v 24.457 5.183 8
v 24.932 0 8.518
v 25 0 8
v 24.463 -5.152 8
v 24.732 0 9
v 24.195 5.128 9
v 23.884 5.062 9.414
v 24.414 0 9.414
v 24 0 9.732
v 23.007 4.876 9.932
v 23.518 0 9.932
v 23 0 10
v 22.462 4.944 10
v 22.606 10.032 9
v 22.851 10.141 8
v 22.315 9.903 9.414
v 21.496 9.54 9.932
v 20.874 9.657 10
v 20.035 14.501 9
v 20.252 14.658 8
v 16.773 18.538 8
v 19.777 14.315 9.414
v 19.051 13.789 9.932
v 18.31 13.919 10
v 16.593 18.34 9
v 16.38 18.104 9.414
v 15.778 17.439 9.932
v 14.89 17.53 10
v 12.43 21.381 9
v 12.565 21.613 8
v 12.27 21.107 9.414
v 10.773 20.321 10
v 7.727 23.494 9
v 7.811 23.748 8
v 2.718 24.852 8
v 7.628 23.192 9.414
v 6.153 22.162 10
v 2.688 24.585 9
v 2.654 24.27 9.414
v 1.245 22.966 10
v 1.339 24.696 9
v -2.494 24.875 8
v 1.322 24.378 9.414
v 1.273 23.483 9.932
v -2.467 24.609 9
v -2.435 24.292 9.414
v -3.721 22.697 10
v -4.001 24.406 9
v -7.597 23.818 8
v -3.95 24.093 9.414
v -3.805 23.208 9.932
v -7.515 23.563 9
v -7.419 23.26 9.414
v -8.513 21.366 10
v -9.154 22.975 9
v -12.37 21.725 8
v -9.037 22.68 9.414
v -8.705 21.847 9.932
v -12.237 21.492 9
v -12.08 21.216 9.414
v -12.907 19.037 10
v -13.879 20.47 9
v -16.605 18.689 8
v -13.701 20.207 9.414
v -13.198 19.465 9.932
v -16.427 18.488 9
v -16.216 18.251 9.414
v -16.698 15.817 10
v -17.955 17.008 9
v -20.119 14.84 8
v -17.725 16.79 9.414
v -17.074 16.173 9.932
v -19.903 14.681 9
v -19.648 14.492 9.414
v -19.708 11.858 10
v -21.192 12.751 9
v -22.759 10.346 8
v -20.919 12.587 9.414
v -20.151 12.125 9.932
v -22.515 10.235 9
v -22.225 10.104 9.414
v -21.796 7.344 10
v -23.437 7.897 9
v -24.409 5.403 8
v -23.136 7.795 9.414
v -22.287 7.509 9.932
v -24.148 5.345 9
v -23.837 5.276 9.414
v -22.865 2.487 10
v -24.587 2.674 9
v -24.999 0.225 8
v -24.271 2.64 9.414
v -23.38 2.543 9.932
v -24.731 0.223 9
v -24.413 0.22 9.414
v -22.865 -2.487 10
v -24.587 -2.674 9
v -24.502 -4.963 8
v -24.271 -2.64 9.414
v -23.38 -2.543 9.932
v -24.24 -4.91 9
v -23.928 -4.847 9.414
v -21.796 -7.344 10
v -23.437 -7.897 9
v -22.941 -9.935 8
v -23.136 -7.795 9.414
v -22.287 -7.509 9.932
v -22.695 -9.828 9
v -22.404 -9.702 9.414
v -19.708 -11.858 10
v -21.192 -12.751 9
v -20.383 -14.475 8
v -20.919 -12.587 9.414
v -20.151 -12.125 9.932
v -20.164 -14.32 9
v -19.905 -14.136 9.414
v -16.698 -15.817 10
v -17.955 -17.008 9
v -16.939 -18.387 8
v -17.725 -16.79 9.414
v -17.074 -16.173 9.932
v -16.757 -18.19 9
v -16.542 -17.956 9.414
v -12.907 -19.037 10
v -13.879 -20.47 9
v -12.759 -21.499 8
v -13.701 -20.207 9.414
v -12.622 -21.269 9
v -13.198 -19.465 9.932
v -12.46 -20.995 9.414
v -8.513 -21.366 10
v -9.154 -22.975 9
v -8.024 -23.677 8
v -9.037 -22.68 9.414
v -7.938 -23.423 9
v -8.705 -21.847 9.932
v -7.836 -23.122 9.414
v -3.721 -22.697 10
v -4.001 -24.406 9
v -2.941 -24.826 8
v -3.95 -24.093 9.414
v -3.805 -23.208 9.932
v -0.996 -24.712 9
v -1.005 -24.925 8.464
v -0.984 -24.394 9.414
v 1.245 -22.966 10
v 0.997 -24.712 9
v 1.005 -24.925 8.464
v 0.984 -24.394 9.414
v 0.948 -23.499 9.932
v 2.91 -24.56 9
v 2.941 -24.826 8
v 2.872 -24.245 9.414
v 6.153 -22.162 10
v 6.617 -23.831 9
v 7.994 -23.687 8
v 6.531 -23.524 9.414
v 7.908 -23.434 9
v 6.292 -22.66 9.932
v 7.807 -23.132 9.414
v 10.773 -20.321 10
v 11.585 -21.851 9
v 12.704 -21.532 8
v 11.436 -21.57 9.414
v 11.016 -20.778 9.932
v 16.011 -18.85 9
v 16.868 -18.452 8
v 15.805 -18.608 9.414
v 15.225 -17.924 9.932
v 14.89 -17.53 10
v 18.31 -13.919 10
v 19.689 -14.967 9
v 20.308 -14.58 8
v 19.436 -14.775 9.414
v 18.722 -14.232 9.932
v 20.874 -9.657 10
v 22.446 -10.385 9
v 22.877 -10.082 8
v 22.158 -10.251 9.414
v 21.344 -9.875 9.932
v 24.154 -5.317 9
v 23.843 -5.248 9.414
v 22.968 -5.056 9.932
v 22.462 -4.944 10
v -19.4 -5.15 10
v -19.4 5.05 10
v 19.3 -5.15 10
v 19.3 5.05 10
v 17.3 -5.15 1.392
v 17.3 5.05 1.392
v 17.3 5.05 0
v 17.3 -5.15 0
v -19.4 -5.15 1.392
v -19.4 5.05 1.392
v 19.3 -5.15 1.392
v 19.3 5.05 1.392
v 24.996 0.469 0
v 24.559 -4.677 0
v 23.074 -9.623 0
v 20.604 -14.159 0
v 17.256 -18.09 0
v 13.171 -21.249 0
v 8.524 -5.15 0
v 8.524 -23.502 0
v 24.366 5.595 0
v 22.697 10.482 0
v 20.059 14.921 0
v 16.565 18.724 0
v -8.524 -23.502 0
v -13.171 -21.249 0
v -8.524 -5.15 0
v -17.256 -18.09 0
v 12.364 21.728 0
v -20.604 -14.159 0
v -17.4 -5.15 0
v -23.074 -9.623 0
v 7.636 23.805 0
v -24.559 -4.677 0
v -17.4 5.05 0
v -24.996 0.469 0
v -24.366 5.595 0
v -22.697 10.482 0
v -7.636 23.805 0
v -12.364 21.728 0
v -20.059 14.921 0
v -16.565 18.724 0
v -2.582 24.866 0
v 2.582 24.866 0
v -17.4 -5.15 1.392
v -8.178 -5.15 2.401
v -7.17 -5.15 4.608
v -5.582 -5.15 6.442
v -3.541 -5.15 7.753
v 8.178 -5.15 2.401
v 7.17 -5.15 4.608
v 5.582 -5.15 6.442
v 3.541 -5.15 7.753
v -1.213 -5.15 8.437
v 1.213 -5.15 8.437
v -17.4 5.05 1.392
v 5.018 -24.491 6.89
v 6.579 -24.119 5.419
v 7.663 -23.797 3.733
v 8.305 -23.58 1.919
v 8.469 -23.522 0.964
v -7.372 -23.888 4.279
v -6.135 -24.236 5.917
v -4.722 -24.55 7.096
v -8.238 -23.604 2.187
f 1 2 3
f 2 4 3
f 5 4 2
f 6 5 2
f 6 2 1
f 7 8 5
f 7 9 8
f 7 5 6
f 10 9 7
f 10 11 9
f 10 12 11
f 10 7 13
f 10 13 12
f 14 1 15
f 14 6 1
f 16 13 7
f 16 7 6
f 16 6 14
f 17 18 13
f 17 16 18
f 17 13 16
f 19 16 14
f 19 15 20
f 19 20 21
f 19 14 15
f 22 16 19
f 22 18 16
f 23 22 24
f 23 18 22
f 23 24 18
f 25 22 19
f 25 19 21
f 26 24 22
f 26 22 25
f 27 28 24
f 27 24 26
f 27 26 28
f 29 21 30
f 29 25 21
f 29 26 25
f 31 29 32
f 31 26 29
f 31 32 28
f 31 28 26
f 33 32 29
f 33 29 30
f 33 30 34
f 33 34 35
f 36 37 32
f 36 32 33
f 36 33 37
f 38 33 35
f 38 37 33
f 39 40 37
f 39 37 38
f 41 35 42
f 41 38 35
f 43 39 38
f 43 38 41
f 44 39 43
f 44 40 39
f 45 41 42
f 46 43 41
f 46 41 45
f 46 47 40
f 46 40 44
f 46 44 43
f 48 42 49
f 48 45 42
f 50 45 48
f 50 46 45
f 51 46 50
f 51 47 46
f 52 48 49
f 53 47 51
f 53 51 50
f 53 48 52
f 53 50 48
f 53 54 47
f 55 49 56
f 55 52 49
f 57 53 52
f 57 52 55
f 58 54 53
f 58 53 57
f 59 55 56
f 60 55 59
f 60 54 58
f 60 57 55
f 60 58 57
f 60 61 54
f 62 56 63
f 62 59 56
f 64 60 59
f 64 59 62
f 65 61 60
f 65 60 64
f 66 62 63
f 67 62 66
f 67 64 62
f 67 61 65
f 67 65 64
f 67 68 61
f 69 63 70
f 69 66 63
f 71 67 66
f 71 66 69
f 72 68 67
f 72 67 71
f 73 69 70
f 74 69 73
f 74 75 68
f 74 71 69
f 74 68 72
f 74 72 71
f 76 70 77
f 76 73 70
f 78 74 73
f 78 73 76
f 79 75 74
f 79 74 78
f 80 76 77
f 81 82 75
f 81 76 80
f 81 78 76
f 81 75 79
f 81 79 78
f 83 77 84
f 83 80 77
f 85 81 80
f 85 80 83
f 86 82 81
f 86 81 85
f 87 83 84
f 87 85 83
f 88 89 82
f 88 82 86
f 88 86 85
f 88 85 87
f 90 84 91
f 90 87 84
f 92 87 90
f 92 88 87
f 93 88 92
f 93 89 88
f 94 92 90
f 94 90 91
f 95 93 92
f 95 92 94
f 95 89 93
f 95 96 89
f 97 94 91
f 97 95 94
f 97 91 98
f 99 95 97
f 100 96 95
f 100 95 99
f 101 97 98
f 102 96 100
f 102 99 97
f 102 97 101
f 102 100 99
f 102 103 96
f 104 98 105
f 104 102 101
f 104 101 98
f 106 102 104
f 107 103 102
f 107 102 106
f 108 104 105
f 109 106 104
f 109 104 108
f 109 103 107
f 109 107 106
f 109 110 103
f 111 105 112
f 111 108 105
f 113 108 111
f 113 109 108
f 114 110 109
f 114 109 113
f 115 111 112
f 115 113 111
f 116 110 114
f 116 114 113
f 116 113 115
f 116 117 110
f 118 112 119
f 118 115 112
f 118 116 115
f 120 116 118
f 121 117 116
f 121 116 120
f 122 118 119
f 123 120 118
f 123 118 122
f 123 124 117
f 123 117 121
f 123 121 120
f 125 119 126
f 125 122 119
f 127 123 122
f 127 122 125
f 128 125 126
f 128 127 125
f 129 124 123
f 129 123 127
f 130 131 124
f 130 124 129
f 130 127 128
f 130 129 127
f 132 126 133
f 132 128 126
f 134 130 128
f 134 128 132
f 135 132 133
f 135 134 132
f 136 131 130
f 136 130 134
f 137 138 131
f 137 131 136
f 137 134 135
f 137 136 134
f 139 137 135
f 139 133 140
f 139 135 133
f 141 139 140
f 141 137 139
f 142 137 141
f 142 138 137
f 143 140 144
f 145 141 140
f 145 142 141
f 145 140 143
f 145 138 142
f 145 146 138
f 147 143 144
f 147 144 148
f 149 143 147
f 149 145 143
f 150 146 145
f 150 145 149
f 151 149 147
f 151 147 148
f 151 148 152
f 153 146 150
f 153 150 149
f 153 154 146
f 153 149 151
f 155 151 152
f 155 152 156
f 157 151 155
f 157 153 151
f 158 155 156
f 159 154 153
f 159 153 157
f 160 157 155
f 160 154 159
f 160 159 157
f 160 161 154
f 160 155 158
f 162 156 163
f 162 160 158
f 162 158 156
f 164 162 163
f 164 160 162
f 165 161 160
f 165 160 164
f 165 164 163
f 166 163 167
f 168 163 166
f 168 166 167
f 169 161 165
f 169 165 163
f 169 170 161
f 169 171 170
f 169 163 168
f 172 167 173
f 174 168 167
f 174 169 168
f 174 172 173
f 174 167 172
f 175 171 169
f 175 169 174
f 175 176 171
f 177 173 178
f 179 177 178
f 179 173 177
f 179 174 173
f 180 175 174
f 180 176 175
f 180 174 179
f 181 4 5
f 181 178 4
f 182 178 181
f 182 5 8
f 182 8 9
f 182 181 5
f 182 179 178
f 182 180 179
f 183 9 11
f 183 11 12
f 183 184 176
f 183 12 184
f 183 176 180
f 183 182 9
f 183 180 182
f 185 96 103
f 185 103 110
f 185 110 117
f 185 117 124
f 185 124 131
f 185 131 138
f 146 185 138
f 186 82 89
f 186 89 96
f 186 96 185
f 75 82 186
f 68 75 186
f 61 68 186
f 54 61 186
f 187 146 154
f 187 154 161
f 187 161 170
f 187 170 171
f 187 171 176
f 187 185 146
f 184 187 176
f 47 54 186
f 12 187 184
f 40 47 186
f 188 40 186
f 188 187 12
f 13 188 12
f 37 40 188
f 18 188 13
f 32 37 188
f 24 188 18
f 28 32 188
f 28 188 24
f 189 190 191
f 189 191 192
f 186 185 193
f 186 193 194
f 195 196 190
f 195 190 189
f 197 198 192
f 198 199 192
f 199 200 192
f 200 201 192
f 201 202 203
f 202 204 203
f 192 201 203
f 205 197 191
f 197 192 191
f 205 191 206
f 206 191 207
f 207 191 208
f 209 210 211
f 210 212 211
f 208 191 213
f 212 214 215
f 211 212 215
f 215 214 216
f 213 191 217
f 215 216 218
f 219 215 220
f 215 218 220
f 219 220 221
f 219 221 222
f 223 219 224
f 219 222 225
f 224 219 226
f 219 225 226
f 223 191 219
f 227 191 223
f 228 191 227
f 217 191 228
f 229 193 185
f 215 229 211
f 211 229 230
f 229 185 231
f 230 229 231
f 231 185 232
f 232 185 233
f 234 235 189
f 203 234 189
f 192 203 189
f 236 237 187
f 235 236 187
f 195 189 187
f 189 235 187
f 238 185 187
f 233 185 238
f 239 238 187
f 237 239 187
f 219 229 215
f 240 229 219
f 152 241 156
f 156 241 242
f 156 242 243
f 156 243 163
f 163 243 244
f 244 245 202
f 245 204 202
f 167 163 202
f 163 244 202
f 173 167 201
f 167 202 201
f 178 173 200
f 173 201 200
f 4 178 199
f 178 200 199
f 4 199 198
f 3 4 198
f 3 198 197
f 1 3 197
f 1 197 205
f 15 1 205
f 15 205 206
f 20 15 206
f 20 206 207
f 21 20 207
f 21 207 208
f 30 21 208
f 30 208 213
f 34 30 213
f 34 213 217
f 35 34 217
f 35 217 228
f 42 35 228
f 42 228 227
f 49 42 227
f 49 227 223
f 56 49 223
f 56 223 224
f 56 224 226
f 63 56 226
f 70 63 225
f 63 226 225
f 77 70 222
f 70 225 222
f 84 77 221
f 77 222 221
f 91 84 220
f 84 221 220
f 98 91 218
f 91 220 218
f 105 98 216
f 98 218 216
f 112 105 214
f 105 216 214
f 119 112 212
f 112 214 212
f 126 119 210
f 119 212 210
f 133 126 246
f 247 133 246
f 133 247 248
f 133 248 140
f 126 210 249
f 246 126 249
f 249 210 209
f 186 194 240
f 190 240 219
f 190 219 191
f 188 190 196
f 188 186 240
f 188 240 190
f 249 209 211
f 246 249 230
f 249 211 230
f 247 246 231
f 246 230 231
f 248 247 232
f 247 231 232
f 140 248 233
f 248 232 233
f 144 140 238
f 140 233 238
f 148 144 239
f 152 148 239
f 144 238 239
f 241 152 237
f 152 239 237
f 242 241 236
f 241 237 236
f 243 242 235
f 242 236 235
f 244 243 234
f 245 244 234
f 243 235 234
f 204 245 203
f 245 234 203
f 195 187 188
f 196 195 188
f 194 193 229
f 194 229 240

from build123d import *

# Parameters (mm, degrees)
F0_R     = 25
F1_DEPTH = 10
F2_W     = 38.7
F2_H     = 10.2
F3_DEPTH = 11
F4_W     = 10.2
F4_H     = 1.3916883618
F5_DEPTH = 2
F6_W     = 10.2
F6_H     = 1.392
F7_DEPTH = 2
F9_DEPTH = 25


# Not quite as in the source:
# - a fillet or chamfer that OpenCascade refuses, or shapes differently, is made with other operations: its cross-section is extruded or revolved along the edge and cut away or added


with BuildPart() as f1:
    # F0 (on Top) → F1 (new body)
    with BuildSketch(Plane.XY):
        Circle(F0_R)
    extrude(amount=F1_DEPTH)

    # F2 (on face) → F3 (cut)
    with BuildSketch(Plane.XY.offset(10)):
        with Locations((-0.05, -0.05)):
            Rectangle(F2_W, F2_H)
    extrude(amount=-F3_DEPTH, mode=Mode.SUBTRACT)

    # F4 (on face) → F5 (join)
    with BuildSketch(Plane(origin=(19.3, 0, 0), x_dir=(0, -1, 0), z_dir=(-1, 0, 0))):
        with Locations((0.05, 0.6958441809)):
            Rectangle(F4_W, F4_H)
    extrude(amount=F5_DEPTH)

    # F6 (on face) → F7 (join)
    with BuildSketch(Plane.YZ.offset(-19.4)):
        with Locations((-0.05, 0.696)):
            Rectangle(F6_W, F6_H)
    extrude(amount=F7_DEPTH)

    # F8 (on face) → F9 (cut)
    with BuildSketch(Plane(origin=(0, -5.15, 0), x_dir=(-1, 0, 0), z_dir=(0, 1, 0))):
        with BuildLine():
            Line((-8.5235216661, 0), (8.5235216661, 0))
            ThreePointArc((8.5235216661, 0), (0, 8.5235216661), (-8.5235216661, 0))
        make_face()
    extrude(amount=-F9_DEPTH, mode=Mode.SUBTRACT)

    # F10: fillet of radius 2 on 1 edges, made by hand

    # F10_s1 → F10_t2 (revolve, cut)
    with BuildSketch(Plane.XZ):
        with BuildLine():
            ThreePointArc((25, 8), (24.4142135624, 9.4142135624), (23, 10))
            Line((23, 10), (25, 10))
            Line((25, 10), (25, 8))
        make_face()
    revolve(axis=Axis((0, 0, 10), (0, 0, 1)), mode=Mode.SUBTRACT)


solid = f1.part
